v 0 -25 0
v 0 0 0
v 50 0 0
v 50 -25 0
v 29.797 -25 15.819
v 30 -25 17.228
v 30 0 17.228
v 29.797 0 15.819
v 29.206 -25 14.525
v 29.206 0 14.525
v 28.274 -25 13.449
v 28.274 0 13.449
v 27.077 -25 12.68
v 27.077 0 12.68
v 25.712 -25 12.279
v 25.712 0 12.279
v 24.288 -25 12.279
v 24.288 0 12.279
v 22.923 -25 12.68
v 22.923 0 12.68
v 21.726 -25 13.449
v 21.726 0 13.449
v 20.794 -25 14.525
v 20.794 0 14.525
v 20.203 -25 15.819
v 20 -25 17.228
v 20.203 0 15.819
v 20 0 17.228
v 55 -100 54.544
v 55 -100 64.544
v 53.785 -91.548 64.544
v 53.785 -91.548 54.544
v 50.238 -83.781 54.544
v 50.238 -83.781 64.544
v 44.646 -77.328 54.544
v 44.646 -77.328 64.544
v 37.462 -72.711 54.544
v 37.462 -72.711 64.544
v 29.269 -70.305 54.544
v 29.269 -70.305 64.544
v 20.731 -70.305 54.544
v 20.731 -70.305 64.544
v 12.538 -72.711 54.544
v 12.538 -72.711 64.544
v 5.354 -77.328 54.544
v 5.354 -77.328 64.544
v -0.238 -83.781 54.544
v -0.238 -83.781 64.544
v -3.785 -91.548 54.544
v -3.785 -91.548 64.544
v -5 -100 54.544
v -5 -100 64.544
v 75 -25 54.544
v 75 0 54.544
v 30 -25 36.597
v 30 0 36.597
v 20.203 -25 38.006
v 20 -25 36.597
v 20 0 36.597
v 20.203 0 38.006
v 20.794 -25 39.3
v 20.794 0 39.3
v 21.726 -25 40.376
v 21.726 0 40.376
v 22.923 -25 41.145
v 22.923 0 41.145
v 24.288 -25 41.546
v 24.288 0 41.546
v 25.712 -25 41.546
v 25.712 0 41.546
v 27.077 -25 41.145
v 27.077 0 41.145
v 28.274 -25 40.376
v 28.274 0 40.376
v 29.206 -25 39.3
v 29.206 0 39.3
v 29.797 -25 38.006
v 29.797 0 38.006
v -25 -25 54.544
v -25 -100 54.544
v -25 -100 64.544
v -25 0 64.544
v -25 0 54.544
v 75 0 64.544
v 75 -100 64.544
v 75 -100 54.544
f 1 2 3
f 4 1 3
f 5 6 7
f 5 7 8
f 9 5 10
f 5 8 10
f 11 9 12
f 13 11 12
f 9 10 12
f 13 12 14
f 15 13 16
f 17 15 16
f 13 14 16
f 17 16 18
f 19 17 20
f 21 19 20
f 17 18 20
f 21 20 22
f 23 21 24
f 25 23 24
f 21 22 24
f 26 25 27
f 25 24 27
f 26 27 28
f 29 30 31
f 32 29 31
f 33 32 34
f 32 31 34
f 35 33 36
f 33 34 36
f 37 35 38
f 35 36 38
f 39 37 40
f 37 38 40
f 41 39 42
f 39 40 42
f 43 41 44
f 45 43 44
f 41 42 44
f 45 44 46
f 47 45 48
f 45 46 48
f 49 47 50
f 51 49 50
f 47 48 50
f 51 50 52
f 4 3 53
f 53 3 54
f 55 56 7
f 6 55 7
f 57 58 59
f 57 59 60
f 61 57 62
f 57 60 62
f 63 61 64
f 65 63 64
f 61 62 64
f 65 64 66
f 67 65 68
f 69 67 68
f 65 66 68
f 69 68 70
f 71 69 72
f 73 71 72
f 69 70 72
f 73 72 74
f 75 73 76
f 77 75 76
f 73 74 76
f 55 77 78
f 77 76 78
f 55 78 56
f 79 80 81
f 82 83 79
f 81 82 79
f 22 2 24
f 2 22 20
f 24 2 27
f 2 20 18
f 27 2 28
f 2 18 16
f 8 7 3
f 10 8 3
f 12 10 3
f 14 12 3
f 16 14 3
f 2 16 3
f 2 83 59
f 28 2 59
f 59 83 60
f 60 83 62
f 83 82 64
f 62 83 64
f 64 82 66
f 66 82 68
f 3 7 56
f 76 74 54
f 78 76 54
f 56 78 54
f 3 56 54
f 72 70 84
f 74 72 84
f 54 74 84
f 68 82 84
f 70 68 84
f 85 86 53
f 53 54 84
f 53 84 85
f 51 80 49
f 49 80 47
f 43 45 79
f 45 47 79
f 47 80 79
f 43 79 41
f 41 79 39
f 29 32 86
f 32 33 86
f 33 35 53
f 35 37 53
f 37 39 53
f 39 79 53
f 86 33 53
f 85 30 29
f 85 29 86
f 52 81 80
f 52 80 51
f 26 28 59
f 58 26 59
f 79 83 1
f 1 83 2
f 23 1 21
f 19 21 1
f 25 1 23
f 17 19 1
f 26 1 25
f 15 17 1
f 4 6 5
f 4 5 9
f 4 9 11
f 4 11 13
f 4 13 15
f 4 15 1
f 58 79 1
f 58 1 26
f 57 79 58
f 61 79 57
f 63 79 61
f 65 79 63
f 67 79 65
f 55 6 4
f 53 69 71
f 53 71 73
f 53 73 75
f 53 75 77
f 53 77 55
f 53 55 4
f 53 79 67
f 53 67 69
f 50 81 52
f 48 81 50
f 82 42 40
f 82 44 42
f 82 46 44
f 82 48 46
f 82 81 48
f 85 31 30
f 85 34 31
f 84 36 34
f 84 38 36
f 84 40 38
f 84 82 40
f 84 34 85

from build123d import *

# Parameters (mm, degrees)
F0_W     = 100
F0_H     = 10
F1_DEPTH = 100
F2_DEPTH = 25
F4_DEPTH = 25
F6_DEPTH = 25


with BuildPart() as f1:
    # F0 (on Front) → F1 (new body)
    with BuildSketch(Plane.XZ):
        with Locations((25, 59.543561)):
            Rectangle(F0_W, F0_H)
    extrude(amount=F1_DEPTH)

    # F0 (on Front) → F2 (join)
    with BuildSketch(Plane.XZ):
        Polygon((-25, 54.543561), (0, 0), (50, 0), (75, 54.543561), align=None)
    extrude(amount=F2_DEPTH)

    # F3 (on face) → F4 (cut)
    with BuildSketch(Plane(origin=(0, 0, 0), x_dir=(-1, 0, 0), z_dir=(0, 1, 0))):
        with BuildLine():
            Line((-20, 17.22778), (-20, 36.596932))
            ThreePointArc((-20, 36.596932), (-25, 41.596932), (-30, 36.596932))
            Line((-30, 36.596932), (-30, 17.22778))
            ThreePointArc((-30, 17.22778), (-25, 12.22778), (-20, 17.22778))
        make_face()
    extrude(amount=-F4_DEPTH, mode=Mode.SUBTRACT)

    # F5 (on face) → F6 (cut)
    with BuildSketch(Plane.XY.offset(64.543561)):
        with BuildLine():
            Line((-5, -100), (55, -100))
            ThreePointArc((55, -100), (25, -70), (-5, -100))
        make_face()
    extrude(amount=-F6_DEPTH, mode=Mode.SUBTRACT)


solid = f1.part
